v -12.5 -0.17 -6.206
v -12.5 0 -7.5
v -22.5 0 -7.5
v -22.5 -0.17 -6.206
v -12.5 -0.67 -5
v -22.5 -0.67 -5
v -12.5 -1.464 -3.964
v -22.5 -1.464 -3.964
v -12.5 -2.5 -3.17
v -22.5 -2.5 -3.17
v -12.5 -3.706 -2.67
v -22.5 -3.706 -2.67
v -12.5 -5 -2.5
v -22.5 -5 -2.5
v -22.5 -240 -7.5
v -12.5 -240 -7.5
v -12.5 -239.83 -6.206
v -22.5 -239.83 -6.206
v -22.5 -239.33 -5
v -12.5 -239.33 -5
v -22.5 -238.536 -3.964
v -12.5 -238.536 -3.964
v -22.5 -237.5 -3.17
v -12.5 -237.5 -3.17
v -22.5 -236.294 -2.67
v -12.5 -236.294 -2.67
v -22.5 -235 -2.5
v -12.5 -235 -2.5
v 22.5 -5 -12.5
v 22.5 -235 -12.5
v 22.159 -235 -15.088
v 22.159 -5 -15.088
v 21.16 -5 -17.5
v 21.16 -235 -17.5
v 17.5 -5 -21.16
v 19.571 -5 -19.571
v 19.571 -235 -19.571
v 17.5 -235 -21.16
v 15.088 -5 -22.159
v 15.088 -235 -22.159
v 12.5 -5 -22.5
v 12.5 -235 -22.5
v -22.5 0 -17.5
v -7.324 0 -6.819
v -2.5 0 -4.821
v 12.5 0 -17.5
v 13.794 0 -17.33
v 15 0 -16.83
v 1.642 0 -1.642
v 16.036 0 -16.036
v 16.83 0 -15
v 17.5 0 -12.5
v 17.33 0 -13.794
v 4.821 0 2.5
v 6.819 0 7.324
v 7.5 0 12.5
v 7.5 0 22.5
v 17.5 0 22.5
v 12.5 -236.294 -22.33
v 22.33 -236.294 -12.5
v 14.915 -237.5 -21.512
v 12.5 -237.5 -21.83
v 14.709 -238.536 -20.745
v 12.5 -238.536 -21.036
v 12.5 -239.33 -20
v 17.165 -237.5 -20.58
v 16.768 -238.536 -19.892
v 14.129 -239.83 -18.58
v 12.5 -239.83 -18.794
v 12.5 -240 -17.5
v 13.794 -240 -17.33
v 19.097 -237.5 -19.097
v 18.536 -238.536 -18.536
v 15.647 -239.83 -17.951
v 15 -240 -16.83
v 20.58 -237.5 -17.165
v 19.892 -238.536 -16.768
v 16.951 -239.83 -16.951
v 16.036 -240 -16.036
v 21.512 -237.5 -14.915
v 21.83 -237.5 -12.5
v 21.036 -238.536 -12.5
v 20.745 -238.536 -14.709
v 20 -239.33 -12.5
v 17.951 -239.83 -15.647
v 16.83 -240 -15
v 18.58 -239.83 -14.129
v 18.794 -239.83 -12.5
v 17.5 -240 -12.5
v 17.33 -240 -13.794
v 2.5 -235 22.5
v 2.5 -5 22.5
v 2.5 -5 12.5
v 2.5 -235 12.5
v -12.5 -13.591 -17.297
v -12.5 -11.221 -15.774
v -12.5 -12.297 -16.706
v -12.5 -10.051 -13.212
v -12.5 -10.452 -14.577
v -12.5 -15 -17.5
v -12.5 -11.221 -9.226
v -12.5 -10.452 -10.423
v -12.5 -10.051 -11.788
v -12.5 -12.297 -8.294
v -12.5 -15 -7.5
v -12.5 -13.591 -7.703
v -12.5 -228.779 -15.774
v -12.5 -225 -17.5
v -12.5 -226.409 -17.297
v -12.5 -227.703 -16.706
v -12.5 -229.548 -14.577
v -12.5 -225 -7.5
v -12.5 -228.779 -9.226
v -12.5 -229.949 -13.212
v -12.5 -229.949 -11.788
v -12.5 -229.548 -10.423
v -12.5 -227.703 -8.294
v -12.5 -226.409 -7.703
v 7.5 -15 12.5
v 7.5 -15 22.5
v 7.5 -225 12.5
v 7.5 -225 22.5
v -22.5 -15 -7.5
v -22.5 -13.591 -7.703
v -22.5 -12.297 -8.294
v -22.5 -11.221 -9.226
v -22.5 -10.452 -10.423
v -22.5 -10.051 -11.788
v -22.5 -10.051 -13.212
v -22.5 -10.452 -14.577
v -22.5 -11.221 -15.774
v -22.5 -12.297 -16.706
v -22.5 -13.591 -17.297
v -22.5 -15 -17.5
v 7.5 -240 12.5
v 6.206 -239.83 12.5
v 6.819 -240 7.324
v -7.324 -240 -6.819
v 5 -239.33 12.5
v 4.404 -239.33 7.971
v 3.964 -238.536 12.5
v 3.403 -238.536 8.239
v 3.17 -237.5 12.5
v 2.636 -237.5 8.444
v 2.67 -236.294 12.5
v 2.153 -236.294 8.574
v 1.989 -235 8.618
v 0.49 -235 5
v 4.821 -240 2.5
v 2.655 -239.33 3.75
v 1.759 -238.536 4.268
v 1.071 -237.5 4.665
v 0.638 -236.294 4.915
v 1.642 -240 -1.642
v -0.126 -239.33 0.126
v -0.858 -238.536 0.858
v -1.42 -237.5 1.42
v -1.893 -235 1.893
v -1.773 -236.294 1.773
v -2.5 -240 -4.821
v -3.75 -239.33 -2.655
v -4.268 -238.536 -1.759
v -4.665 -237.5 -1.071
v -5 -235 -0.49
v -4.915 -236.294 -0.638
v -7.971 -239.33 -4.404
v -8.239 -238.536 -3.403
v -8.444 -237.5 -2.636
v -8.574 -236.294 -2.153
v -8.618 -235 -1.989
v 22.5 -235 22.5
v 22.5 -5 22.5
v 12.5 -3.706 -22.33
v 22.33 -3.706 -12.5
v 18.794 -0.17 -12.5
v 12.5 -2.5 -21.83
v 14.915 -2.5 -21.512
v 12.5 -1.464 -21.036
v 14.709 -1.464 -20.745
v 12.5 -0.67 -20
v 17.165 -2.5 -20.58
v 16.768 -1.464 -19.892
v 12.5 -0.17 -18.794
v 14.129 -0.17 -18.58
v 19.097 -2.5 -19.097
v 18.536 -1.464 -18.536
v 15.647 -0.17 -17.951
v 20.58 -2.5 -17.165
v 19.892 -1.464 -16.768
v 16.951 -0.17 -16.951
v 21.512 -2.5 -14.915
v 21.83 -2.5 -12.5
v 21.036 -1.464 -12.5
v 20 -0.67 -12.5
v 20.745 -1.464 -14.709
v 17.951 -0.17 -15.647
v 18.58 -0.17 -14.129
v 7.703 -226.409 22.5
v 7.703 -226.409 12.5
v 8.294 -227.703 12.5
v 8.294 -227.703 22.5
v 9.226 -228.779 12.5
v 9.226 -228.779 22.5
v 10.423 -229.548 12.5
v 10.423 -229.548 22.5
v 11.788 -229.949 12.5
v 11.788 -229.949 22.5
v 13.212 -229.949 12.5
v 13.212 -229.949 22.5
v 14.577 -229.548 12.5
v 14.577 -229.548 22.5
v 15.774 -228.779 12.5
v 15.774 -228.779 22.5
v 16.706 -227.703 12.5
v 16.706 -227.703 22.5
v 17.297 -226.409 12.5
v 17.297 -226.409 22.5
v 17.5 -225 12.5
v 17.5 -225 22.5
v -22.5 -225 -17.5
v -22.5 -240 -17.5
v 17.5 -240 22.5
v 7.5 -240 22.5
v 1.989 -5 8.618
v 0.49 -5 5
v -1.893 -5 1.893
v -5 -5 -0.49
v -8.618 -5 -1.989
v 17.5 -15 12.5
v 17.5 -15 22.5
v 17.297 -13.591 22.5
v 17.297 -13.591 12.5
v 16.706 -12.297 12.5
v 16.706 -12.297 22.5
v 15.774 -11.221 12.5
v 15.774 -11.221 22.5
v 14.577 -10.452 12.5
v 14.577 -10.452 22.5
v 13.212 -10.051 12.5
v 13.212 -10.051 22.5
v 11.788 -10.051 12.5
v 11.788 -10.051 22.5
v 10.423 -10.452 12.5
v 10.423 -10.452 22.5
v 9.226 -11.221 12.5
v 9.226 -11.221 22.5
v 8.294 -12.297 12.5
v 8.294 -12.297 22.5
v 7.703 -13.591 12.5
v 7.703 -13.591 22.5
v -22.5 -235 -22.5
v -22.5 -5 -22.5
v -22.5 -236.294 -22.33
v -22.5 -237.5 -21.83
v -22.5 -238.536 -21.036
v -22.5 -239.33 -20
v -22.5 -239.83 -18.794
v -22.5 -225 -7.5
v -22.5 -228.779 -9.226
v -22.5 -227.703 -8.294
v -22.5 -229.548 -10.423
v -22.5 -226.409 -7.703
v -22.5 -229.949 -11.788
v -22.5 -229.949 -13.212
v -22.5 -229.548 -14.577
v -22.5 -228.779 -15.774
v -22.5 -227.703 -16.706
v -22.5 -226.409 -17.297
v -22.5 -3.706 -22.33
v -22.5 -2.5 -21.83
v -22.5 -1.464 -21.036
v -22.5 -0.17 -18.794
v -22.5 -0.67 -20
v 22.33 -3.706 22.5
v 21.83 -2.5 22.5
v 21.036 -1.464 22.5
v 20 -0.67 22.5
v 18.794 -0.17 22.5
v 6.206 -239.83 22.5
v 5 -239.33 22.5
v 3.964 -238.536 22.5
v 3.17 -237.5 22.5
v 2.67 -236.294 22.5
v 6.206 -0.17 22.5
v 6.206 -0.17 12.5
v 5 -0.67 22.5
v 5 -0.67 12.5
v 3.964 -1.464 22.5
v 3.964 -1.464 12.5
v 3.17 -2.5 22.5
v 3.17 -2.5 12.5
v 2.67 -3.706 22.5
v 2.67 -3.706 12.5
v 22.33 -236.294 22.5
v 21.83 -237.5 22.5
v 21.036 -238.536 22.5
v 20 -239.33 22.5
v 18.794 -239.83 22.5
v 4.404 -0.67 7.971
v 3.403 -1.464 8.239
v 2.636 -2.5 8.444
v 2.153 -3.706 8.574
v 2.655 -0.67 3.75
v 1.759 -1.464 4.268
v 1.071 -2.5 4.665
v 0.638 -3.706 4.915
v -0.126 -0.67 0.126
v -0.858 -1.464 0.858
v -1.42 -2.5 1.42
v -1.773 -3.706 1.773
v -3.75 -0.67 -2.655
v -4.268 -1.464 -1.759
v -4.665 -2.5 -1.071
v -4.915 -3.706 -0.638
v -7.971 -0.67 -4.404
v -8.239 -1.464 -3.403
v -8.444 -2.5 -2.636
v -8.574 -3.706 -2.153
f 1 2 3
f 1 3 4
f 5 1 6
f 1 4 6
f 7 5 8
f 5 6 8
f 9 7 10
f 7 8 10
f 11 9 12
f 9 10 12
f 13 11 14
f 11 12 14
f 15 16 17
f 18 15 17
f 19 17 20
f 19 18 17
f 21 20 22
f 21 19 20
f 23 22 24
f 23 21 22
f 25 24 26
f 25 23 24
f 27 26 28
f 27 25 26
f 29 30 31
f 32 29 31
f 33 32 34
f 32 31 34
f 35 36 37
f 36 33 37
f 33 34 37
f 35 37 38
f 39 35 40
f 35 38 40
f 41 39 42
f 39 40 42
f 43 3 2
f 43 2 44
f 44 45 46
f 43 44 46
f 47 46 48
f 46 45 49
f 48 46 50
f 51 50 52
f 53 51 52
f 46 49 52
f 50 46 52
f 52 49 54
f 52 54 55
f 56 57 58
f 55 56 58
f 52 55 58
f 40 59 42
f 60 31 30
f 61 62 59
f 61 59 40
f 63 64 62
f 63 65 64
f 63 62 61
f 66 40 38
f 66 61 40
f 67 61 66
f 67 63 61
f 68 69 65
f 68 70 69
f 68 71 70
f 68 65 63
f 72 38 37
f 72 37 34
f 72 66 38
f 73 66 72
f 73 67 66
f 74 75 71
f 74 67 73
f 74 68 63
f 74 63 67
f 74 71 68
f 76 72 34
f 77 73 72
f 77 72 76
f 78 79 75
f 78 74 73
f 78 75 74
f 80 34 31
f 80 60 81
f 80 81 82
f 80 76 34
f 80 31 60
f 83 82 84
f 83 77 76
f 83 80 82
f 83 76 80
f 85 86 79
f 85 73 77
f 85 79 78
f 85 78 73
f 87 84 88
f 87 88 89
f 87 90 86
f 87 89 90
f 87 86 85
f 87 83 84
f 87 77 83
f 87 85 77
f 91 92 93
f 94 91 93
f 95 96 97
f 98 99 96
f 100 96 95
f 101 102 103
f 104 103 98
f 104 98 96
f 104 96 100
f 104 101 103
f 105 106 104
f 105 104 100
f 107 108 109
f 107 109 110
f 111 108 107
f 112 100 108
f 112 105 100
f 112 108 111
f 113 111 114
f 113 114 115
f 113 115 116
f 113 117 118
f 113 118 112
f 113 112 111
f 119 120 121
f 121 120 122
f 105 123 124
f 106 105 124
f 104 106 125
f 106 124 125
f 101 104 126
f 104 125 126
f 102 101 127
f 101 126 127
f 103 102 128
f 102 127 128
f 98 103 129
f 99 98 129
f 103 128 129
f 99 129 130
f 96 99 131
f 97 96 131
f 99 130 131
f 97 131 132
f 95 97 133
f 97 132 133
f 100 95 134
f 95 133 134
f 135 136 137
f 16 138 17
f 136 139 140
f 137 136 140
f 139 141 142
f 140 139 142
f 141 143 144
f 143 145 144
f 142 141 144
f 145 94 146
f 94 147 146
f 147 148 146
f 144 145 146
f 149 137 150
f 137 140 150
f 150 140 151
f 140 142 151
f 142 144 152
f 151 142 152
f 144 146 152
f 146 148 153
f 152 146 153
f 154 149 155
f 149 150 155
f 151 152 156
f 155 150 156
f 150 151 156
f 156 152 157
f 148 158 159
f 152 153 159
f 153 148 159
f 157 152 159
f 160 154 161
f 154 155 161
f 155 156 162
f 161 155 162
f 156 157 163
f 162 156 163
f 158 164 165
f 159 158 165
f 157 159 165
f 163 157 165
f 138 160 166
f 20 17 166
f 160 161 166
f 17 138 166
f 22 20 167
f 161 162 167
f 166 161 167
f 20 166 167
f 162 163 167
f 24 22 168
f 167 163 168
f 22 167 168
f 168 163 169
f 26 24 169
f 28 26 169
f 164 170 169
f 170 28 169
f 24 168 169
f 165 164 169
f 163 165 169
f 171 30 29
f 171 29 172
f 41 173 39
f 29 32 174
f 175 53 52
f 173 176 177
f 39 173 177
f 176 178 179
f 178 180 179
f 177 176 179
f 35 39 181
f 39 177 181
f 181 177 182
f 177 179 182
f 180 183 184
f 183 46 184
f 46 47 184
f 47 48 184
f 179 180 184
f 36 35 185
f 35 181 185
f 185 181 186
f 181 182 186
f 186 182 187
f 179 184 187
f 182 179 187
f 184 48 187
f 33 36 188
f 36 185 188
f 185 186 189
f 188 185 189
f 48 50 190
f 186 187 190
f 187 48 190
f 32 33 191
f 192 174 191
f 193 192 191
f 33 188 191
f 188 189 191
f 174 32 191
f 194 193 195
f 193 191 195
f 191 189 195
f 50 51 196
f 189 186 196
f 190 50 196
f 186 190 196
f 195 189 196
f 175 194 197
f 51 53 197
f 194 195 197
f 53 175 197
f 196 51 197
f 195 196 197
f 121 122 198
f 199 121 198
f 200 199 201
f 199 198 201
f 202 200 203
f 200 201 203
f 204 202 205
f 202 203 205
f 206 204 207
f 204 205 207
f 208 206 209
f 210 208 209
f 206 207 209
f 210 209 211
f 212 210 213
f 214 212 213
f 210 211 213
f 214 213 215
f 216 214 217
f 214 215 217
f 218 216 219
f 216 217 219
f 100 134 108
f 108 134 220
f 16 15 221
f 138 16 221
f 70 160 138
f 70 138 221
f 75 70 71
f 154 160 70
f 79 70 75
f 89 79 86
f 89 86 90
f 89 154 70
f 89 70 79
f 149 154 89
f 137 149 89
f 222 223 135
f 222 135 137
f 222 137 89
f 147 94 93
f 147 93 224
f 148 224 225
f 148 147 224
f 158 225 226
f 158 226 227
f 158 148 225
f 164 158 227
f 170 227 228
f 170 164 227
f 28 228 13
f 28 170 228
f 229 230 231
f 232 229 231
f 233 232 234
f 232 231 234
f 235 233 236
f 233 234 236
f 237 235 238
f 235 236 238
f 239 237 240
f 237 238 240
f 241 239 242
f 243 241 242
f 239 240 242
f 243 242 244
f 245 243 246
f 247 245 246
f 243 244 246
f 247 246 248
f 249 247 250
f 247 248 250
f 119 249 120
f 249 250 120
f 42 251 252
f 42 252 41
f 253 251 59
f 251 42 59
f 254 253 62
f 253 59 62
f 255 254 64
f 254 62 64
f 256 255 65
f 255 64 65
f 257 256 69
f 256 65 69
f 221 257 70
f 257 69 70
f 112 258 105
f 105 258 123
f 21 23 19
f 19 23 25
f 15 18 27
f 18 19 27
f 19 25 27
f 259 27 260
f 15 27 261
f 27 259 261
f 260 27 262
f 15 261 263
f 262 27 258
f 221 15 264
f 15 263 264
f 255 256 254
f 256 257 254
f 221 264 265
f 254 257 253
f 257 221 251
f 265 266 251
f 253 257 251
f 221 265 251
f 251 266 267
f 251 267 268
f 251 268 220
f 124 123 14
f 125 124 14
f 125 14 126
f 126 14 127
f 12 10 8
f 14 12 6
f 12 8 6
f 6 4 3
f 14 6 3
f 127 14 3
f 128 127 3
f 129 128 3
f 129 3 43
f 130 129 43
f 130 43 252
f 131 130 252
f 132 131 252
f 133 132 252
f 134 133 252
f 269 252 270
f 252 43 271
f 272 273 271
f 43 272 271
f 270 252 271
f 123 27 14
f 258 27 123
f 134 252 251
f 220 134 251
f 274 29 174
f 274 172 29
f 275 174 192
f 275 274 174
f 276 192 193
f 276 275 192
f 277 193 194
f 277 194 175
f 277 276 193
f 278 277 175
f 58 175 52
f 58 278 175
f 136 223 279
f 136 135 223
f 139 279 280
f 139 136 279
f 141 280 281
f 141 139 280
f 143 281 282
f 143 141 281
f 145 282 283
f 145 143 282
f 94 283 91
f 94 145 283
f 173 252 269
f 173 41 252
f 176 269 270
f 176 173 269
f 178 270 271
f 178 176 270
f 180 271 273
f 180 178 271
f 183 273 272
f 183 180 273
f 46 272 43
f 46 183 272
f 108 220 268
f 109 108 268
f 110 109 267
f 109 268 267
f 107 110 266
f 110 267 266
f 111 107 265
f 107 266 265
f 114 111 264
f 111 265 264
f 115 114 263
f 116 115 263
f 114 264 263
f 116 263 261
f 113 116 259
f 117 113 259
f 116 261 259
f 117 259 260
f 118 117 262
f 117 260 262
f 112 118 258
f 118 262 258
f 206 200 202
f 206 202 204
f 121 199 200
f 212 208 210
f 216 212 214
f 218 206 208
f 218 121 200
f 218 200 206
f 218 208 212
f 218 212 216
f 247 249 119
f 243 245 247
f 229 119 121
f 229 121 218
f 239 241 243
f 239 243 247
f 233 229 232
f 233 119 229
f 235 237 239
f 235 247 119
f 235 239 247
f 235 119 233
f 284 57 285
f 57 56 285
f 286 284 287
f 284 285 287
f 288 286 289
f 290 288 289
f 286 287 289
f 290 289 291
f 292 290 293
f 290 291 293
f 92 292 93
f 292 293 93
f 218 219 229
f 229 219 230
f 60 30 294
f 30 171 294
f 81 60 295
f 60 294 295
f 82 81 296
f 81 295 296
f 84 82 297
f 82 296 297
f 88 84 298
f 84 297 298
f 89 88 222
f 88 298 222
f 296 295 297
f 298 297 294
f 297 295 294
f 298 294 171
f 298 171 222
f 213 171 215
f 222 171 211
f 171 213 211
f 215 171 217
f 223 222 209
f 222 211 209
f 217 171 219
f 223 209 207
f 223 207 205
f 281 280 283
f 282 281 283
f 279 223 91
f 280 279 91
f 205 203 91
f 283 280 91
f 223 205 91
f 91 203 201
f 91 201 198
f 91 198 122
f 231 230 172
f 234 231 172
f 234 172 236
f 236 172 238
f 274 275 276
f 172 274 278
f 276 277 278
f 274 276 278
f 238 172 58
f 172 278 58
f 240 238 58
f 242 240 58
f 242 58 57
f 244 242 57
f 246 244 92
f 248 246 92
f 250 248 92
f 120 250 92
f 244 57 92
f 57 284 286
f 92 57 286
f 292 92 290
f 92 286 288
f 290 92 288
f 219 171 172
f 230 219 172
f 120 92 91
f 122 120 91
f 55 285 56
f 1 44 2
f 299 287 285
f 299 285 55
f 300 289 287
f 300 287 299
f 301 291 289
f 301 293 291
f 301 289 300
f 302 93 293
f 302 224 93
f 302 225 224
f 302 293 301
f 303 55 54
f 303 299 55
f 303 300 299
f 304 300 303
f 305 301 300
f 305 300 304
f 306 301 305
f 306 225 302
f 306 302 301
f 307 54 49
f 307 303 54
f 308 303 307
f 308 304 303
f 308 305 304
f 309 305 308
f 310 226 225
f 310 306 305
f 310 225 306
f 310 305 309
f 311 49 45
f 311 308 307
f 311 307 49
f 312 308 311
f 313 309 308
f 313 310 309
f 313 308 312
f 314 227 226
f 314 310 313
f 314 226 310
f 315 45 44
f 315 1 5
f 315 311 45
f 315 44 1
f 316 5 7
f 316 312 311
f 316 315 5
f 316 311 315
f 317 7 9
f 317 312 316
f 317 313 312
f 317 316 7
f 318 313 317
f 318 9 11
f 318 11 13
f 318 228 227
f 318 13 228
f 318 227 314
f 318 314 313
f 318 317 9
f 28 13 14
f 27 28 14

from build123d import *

# Parameters (mm, degrees)
F1_DEPTH = 240
F2_R     = 15
F3_R     = 10
F5_DEPTH = 10
F7_DEPTH = 10
F8_R     = 5
F9_R     = 5
F10_R    = 5


with BuildPart() as f1:
    # F0 (on Front) → F1 (new body)
    with BuildSketch(Plane.XZ):
        Polygon((-22.5, -22.5), (22.5, -22.5), (22.5, 22.5), (2.5, 22.5), (2.5, -2.5), (-22.5, -2.5), align=None)
    extrude(amount=F1_DEPTH)

    # F2
    f2_edges = [f1.edges().sort_by_distance(p)[0] for p in [
        (2.5, -120, -2.5),
    ]]
    fillet(f2_edges, radius=F2_R)

    # F3
    f3_edges = [f1.edges().sort_by_distance(p)[0] for p in [
        (22.5, -120, -22.5),
    ]]
    fillet(f3_edges, radius=F3_R)

    # F4 (on face) → F5 (cut)
    with BuildSketch(Plane.XY.offset(22.5)):
        with BuildLine():
            Line((7.5, -15), (7.5, -225))
            ThreePointArc((7.5, -225), (12.5, -230), (17.5, -225))
            Line((17.5, -225), (17.5, -15))
            ThreePointArc((17.5, -15), (12.5, -10), (7.5, -15))
        make_face()
    extrude(amount=-F5_DEPTH, mode=Mode.SUBTRACT)

    # F6 (on face) → F7 (cut)
    with BuildSketch(Plane(origin=(-22.5, 0, 0), x_dir=(0, -1, 0), z_dir=(-1, 0, 0))):
        with BuildLine():
            Line((225, -7.5), (15, -7.5))
            ThreePointArc((15, -7.5), (10, -12.5), (15, -17.5))
            Line((15, -17.5), (225, -17.5))
            ThreePointArc((225, -17.5), (230, -12.5), (225, -7.5))
        make_face()
    extrude(amount=-F7_DEPTH, mode=Mode.SUBTRACT)

    # F8
    f8_edges = [f1.edges().sort_by_distance(p)[0] for p in [
        (22.5, -240, 5),
        (19.571068, -240, -19.571068),
    ]]
    fillet(f8_edges, radius=F8_R)

    # F9
    f9_edges = [f1.edges().sort_by_distance(p)[0] for p in [
        (22.5, 0, 5),
    ]]
    fillet(f9_edges, radius=F9_R)

    # F10
    f10_edges = [f1.edges().sort_by_distance(p)[0] for p in [
        (-1.893398, -240, 1.893398),
        (-1.893398, 0, 1.893398),
    ]]
    fillet(f10_edges, radius=F10_R)


solid = f1.part
